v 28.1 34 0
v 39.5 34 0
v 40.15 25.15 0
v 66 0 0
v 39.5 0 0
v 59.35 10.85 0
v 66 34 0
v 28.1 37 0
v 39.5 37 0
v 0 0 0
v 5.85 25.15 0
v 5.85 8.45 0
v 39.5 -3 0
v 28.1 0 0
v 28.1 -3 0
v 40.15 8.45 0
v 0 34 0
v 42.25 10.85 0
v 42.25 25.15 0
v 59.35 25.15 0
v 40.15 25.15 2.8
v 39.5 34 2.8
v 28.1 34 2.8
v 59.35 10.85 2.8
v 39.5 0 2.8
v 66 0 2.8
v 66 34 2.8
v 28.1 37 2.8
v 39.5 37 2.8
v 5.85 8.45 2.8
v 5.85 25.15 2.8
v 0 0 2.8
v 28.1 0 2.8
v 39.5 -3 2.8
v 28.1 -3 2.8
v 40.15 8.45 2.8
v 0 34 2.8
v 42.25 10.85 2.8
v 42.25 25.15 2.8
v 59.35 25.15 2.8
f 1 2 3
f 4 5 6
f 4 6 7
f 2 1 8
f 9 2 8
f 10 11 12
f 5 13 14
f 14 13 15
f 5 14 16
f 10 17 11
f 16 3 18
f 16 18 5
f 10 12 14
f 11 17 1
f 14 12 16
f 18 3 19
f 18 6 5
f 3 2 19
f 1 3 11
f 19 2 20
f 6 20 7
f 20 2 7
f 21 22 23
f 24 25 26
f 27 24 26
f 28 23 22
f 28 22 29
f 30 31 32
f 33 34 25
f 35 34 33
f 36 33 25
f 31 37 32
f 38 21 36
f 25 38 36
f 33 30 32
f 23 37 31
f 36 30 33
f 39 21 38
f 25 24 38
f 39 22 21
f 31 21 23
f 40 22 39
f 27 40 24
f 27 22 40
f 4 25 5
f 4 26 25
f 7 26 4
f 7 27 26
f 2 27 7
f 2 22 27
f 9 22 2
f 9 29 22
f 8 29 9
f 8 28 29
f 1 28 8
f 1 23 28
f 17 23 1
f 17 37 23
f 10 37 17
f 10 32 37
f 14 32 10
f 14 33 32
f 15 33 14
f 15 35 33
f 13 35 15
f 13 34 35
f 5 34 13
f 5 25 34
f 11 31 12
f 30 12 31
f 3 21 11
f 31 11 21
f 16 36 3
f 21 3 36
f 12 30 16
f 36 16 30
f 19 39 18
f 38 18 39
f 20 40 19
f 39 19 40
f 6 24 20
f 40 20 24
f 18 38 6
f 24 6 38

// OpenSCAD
// =====================================================================================================
//  PARED DE USB Y RED de la caja de metacrilato de la Orange Pi 5 Pro — repuesto impreso (2026-11-24)
//  Todas las medidas son del usuario, con calibre, sobre la pieza rota. Las letras son las de la hoja
//  medidas-pared-caja.png. Vista de frente: ventana grande a la izquierda. Origen: esquina de abajo a la izquierda.
//  Se imprime tumbada, sin soportes.   Exportar:  openscad -o pared_usb.stl --export-format binstl pared.scad
// =====================================================================================================
A = 66;      // ancho total, sin pestañas
B = 34;      // alto total, sin pestañas
C = 28;      // del canto izquierdo a la pestaña (arriba y abajo: C = F)
D = 11.6;    // ancho de la pestaña (arriba y abajo: D = G)
E = 3;       // alto de la pestaña (arriba y abajo: E = H)
J = 6;       // del canto izquierdo a la ventana grande
K = 9;       // del canto de arriba a las dos ventanas (K = P)
L = 34;      // ancho de la ventana grande
M = 16.4;    // alto de la ventana grande
N = 6.8;     // de la ventana pequeña al canto derecho
Q = 16.8;    // ancho de la ventana pequeña
R = 14;      // alto de la ventana pequeña
t = 2.8;     // espesor

h_pes = 0.2; // las pestañas se imprimen este poco más estrechas en total, para que entren en sus ranuras
h_ven = 0.15;// las ventanas se abren este poco por cada lado: un hueco impreso sale algo más pequeño que su medida

module pared2d() {
  difference() {
    union() {
      square([A, B]);
      translate([C + h_pes/2, -E]) square([D - h_pes, B + 2*E]);            // las dos pestañas
    }
    translate([J - h_ven, B - K - M - h_ven]) square([L + 2*h_ven, M + 2*h_ven]);          // ventana grande (USB)
    translate([A - N - Q - h_ven, B - K - R - h_ven]) square([Q + 2*h_ven, R + 2*h_ven]);  // ventana pequeña (red)
  }
}
linear_extrude(t) pared2d();
echo(entre_ventanas = A - N - Q - J - L, bajo_ventana_grande = B - K - M, bajo_ventana_pequena = B - K - R);
